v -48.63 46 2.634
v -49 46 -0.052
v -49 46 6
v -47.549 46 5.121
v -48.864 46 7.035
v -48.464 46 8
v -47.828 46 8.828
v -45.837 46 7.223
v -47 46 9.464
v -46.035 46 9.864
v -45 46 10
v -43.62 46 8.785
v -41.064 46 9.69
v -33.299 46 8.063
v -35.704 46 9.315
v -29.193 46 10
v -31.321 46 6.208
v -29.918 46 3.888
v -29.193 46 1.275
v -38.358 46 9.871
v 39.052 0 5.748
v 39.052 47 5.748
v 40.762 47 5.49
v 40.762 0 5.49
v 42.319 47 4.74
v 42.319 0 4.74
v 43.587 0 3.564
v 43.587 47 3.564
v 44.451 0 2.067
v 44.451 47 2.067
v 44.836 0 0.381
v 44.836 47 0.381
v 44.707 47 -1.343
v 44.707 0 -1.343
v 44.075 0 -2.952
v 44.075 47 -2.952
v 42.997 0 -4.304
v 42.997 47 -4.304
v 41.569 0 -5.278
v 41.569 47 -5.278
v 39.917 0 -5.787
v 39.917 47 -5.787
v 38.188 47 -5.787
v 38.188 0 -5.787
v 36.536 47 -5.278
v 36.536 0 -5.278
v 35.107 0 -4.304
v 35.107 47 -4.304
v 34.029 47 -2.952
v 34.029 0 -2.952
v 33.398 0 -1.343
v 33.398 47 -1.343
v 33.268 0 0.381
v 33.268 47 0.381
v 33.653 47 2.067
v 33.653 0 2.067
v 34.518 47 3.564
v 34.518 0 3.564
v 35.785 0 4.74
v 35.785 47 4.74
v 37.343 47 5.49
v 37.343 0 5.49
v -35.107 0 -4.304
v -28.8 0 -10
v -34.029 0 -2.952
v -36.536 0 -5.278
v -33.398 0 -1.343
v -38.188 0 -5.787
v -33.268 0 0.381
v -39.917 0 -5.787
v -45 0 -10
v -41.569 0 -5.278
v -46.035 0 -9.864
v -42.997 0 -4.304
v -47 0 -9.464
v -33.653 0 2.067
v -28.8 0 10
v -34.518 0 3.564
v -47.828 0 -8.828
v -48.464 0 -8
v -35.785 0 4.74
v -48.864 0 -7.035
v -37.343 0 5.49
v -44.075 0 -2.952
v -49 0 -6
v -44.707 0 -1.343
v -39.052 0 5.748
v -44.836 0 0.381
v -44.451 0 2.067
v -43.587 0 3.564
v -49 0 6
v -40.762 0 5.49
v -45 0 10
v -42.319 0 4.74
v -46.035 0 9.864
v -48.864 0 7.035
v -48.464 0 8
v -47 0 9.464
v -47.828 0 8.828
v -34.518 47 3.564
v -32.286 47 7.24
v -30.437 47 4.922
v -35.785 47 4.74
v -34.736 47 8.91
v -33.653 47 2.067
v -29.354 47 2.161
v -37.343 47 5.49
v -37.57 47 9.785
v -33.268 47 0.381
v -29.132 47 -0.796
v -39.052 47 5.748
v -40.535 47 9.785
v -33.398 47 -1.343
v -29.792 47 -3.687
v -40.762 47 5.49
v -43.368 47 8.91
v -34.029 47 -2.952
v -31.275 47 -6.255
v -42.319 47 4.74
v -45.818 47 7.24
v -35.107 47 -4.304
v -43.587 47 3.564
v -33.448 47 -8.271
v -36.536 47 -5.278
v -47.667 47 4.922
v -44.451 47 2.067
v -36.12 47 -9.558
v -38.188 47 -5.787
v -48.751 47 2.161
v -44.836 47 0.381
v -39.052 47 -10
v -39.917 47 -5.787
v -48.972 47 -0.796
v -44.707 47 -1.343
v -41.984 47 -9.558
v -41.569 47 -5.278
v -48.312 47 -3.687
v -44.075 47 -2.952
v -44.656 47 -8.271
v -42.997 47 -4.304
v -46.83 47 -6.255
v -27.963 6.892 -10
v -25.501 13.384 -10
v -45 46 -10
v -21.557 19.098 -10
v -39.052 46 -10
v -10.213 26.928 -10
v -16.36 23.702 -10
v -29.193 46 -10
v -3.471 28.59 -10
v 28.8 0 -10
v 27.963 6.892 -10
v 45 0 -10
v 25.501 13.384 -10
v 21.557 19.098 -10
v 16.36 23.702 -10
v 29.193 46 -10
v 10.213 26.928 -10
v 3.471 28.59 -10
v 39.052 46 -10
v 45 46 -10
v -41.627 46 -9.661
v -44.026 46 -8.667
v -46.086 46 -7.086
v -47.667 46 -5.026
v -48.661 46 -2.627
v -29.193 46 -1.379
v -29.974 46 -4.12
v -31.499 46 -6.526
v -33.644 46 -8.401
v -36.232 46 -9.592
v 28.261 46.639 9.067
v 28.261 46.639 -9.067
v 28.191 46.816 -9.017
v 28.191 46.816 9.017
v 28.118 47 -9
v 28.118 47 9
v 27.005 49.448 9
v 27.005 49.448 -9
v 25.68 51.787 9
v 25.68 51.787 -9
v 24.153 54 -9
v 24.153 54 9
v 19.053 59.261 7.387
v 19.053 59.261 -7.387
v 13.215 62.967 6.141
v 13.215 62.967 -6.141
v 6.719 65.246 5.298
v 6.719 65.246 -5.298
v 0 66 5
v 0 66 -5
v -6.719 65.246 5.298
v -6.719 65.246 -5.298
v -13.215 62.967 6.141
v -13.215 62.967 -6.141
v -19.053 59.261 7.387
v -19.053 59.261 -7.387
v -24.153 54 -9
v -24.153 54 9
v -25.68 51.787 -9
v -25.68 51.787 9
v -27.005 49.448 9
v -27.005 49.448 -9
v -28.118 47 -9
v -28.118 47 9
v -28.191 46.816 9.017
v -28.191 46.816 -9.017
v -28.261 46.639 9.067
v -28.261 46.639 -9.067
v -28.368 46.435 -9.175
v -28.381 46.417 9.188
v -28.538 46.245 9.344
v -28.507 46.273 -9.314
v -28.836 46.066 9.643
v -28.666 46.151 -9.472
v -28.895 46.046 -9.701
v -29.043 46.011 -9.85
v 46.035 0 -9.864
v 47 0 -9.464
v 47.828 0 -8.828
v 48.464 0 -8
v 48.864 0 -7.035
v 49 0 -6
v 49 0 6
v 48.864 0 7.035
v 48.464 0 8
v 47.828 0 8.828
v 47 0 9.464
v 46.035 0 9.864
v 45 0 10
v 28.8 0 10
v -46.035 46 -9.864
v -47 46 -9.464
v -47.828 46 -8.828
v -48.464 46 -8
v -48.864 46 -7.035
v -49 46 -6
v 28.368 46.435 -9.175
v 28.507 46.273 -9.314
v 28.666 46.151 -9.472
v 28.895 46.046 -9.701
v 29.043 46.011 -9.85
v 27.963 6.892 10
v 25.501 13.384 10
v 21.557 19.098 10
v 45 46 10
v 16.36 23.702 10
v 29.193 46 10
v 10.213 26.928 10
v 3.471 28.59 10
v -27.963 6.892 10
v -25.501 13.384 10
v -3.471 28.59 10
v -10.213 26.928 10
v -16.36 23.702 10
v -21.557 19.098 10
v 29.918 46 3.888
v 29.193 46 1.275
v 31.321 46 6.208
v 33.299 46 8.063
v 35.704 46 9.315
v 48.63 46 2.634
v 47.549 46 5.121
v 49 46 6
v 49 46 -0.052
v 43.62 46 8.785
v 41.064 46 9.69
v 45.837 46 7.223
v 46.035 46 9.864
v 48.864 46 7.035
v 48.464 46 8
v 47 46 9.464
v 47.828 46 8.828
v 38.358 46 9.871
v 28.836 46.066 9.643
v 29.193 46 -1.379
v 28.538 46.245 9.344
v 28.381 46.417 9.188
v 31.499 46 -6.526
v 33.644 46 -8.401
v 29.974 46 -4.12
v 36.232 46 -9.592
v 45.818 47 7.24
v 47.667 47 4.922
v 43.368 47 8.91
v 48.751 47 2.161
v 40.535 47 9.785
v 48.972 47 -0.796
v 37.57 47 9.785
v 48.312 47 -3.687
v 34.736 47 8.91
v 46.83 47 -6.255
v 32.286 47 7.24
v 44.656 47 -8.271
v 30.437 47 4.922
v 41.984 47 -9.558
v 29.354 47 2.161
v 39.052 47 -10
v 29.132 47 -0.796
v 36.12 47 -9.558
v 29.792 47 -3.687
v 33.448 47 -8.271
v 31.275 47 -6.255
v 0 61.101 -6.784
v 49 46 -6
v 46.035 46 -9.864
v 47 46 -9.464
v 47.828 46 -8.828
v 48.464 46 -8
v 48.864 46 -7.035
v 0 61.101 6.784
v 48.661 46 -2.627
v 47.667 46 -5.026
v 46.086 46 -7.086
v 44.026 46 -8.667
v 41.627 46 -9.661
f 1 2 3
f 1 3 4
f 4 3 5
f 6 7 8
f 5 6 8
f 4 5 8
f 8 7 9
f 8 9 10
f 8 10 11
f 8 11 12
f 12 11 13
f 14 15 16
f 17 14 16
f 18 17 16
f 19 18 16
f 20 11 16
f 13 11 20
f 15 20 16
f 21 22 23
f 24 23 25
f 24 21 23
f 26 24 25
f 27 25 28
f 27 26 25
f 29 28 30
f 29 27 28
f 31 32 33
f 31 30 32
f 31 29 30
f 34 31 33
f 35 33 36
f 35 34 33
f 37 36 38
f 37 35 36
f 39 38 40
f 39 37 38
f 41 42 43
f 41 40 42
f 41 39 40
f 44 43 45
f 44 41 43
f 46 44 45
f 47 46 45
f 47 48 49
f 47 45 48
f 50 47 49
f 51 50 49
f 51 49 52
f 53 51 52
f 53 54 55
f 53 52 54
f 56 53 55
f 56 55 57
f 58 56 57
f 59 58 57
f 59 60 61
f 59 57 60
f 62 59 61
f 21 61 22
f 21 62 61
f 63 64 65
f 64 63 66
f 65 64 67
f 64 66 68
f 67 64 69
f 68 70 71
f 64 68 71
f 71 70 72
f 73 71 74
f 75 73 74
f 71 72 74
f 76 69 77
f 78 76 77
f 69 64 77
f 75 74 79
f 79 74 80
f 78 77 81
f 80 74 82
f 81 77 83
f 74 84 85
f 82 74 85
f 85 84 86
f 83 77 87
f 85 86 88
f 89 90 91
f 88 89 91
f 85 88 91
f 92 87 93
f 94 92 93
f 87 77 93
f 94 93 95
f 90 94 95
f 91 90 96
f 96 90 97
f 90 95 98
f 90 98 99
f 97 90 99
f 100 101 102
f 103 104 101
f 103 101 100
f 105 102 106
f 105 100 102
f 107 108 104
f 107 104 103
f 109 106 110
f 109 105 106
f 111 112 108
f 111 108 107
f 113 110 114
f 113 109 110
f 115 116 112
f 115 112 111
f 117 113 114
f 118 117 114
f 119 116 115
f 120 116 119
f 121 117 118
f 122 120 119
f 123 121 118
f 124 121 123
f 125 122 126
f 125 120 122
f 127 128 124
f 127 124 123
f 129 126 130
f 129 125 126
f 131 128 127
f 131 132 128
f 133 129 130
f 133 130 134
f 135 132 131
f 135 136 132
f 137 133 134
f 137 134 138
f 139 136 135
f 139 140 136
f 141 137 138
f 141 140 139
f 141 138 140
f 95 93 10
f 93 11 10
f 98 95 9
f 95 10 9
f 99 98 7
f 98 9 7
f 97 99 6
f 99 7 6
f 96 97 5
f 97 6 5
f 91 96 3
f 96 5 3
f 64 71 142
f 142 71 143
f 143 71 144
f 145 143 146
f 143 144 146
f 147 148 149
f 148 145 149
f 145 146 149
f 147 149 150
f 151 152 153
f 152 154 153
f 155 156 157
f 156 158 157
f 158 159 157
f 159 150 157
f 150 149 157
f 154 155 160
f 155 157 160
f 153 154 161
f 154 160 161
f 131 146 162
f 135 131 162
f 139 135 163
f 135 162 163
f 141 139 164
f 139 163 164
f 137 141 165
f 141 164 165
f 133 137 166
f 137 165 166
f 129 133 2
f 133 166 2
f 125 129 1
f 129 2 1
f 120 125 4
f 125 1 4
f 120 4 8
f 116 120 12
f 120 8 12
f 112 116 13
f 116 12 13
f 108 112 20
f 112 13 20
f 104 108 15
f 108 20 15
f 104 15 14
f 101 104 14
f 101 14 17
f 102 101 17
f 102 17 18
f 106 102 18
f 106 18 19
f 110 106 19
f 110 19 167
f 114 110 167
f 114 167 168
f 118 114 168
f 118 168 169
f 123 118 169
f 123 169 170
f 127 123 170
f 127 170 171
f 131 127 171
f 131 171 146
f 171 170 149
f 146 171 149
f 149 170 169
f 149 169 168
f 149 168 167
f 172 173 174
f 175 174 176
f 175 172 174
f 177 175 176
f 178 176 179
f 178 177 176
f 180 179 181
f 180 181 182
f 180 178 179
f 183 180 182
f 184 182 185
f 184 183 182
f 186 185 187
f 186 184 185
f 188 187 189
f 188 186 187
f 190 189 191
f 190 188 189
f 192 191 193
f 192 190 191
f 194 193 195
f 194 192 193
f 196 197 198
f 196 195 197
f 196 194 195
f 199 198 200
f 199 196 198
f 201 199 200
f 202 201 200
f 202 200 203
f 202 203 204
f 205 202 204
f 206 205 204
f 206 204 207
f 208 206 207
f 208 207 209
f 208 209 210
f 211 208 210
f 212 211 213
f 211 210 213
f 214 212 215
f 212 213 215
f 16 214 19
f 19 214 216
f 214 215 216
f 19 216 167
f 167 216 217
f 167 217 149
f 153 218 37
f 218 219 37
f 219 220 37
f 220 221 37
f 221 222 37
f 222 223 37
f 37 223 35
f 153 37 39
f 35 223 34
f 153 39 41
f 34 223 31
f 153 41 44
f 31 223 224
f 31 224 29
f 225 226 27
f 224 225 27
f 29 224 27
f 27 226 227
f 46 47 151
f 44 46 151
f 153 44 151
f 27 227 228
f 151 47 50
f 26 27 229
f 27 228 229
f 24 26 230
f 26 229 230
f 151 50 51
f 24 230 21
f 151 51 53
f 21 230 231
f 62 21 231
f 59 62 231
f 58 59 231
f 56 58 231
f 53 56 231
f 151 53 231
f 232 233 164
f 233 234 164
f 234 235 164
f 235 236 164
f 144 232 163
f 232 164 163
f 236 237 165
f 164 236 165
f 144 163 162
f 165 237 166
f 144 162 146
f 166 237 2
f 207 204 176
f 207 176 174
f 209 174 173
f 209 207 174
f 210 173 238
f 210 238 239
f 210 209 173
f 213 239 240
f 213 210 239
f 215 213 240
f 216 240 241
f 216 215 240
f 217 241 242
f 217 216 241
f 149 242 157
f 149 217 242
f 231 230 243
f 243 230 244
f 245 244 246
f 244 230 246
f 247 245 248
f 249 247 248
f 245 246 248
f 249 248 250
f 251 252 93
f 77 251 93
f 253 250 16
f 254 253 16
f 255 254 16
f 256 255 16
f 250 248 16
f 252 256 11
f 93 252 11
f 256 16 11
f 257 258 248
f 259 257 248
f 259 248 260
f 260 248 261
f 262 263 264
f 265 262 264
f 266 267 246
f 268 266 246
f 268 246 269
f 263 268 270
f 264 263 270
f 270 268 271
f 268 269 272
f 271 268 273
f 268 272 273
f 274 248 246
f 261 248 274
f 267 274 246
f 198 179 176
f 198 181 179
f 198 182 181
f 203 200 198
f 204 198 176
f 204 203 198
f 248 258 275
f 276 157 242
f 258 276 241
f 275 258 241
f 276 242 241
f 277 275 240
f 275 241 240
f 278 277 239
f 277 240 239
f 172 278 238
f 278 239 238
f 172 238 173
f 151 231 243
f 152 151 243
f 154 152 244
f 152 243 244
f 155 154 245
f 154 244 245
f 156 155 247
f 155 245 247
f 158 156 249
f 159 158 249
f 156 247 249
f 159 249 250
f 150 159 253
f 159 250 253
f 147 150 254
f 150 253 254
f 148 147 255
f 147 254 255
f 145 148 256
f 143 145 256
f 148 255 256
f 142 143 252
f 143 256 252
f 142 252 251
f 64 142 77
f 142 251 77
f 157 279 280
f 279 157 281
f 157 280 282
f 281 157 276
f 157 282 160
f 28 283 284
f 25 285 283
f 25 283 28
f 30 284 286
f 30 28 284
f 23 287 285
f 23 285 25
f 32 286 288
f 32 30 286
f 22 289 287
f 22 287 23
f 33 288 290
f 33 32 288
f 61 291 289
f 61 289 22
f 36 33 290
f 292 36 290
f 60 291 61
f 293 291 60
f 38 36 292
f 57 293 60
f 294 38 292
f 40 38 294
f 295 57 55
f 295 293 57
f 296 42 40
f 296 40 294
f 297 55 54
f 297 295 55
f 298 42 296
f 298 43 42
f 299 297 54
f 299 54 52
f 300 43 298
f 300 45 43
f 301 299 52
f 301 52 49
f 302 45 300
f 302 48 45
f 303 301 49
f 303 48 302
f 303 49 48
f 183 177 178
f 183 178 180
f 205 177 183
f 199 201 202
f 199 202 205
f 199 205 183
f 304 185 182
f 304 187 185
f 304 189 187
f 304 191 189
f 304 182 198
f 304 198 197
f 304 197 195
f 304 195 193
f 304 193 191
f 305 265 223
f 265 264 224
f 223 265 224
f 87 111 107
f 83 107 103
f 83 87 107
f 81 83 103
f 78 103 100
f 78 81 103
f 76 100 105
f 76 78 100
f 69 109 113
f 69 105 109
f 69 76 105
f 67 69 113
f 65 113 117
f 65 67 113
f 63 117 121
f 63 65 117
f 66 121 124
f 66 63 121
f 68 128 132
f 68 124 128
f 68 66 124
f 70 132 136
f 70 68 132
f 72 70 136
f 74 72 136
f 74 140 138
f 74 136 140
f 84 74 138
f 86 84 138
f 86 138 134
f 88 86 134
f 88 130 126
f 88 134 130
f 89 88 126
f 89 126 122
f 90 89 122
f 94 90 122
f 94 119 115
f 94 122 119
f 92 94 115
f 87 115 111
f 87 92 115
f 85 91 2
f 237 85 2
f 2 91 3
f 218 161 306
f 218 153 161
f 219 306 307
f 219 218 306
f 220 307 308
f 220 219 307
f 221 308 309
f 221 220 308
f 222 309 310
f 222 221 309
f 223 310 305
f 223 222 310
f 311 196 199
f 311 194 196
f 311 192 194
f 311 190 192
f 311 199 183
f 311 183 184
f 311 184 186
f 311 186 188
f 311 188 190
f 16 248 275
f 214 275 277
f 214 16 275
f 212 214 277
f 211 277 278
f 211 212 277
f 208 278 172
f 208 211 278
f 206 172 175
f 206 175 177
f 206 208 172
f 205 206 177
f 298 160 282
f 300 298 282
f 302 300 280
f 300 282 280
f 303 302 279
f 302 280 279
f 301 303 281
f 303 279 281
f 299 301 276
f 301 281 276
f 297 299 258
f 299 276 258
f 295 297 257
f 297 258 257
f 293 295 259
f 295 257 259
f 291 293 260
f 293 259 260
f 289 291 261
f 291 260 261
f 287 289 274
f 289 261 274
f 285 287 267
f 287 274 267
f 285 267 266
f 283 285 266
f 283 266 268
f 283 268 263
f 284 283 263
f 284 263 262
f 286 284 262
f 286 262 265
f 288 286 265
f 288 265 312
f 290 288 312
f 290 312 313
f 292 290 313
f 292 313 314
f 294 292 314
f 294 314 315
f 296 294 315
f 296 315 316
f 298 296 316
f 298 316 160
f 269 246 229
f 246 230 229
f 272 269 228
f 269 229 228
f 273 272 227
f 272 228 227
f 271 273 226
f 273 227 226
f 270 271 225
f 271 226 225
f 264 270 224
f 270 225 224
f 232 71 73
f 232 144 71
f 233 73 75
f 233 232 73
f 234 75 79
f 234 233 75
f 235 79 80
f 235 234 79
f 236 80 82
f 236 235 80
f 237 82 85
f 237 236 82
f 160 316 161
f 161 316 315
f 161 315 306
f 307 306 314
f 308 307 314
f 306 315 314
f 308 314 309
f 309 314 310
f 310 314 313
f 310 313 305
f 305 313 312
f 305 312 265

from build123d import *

# Parameters (mm, degrees)
SALIENTE_EXTRUIR2_DEPTH    = 10
CROQUIS3_R                 = 9.947805623
SALIENTE_EXTRUIR3_DEPTH    = 1
CORTAR_EXTRUIR1_DEPTH      = 68.948509917
CORTAR_EXTRUIR1_DEPTH_BACK = 68.948509917
CROQUIS4_R                 = 5.8
SALIENTE_EXTRUIR4_DEPTH    = 9
CORTAR_EXTRUIR2_DEPTH      = 83.807004535
CORTAR_EXTRUIR2_DEPTH_BACK = 83.807004535
REDONDEO3_START            = -10.0000001
REDONDEO3_DEPTH            = 1.0000001
REDONDEO3_START_2          = 9
REDONDEO3_2_DEPTH          = 1
REDONDEO3_START_3          = -9
REDONDEO3_3_DEPTH          = 18
REDONDEO3_START_4          = -29.193321254
REDONDEO3_4_DEPTH          = 58.386642508
REDONDEO4_R                = 4


with BuildPart() as part:
    # Croquis2 → Saliente-Extruir2 (new, symmetric)
    with BuildSketch(Plane.XY):
        with BuildLine():
            Line((-49, 0), (-49, 46))
            Line((-49, 46), (49, 46))
            Line((49, 46), (49, 0))
            Line((49, 0), (28.8, 0))
            ThreePointArc((28.8, 0), (0, 28.8), (-28.8, 0))
            Line((-28.8, 0), (-49, 0))
        make_face()
    extrude(amount=SALIENTE_EXTRUIR2_DEPTH, both=True)

    # Croquis3 → Saliente-Extruir3 (add)
    with BuildSketch(Plane(origin=(0, 46, 0), x_dir=(1, 0, 0), z_dir=(0, 1, 0))):
        with Locations(Location((-39.052194377, 0.052194377, 0), (0, 0, 90))):
            Circle(CROQUIS3_R)
        with Locations(Location((39.052194377, 0.052194377, 0), (0, 0, 90))):
            Circle(CROQUIS3_R)
    extrude(amount=SALIENTE_EXTRUIR3_DEPTH)

    # Croquis4 → Cortar-Extruir1 (cut, two sides: drawn at the far end of the back side and taken through both)
    with BuildSketch(Plane(origin=(0, 46, 0), x_dir=(1, 0, 0), z_dir=(0, 1, 0)).offset(-CORTAR_EXTRUIR1_DEPTH_BACK)):
        with Locations(Location((-39.052194377, 0.052194377, 0), (0, 0, 270))):
            Circle(CROQUIS4_R)
        with Locations(Location((39.052194377, 0.052194377, 0), (0, 0, 270))):
            Circle(CROQUIS4_R)
    extrude(amount=CORTAR_EXTRUIR1_DEPTH + CORTAR_EXTRUIR1_DEPTH_BACK, mode=Mode.SUBTRACT)

    # Croquis5 → Saliente-Extruir4 (add, symmetric)
    with BuildSketch(Plane.XY):
        with BuildLine():
            Line((-28.5, 46), (28.5, 46))
            ThreePointArc((28.5, 46), (0, 66), (-28.5, 46))
        make_face()
    extrude(amount=SALIENTE_EXTRUIR4_DEPTH, both=True)

    # Croquis6 → Cortar-Extruir2 (cut, two sides: drawn at the far end of the back side and taken through both)
    with BuildSketch(Plane(origin=(0, 0, 0), x_dir=(0, 0, -1), z_dir=(1, 0, 0)).offset(-CORTAR_EXTRUIR2_DEPTH_BACK)):
        with BuildLine():
            Line((-9, 66), (-9, 54))
            add(Edge.make_bspline(
                [(-9, 54), (-6.728088744, 61.714285714), (-5, 66)],
                knots=[0, 0, 0, 0.174230423, 0.174230423, 0.174230423], degree=2, weights=[1, 1.104611797, 1.172770478]))
            Line((-5, 66), (-9, 66))
        make_face()
        with BuildLine():
            add(Edge.make_bspline(
                [(5, 66), (6.728088744, 61.714285714), (9, 54)],
                knots=[0.825769577, 0.825769577, 0.825769577, 1, 1, 1], degree=2, weights=[1.172770478, 1.104611797, 1]))
            Line((9, 54), (9, 66))
            Line((9, 66), (5, 66))
        make_face()
    extrude(amount=CORTAR_EXTRUIR2_DEPTH + CORTAR_EXTRUIR2_DEPTH_BACK, mode=Mode.SUBTRACT)

    # Redondeo3: read off the stored shape, not the designer's step
    # Redondeo3 outline → Redondeo3 (add)
    with BuildSketch(Plane.XY.offset(REDONDEO3_START)):
        with BuildLine():
            Line((-29.193321154, 46), (29.193321154, 46))
            ThreePointArc((29.193321154, 46), (28.62814416, 46.175030325), (28.260813391, 46.63885007))
            ThreePointArc((28.260813391, 46.63885007), (0, 66), (-28.260813391, 46.63885007))
            ThreePointArc((-28.260813391, 46.63885007), (-28.62814416, 46.175030325), (-29.193321154, 46))
        make_face()
    extrude(amount=REDONDEO3_DEPTH)

    # Redondeo3 2 outline → Redondeo3 2 (add)
    with BuildSketch(Plane.XY.offset(REDONDEO3_START_2)):
        with BuildLine():
            Line((-29.193321154, 46), (29.193321154, 46))
            ThreePointArc((29.193321154, 46), (28.62814416, 46.175030325), (28.260813391, 46.63885007))
            ThreePointArc((28.260813391, 46.63885007), (0, 66), (-28.260813391, 46.63885007))
            ThreePointArc((-28.260813391, 46.63885007), (-28.62814416, 46.175030325), (-29.193321154, 46))
        make_face()
    extrude(amount=REDONDEO3_2_DEPTH)

    # Redondeo3 3 outline → Redondeo3 3 (add)
    with BuildSketch(Plane.XY.offset(REDONDEO3_START_3)):
        with BuildLine():
            ThreePointArc((-28.5, 46), (-28.382204223, 46.320098033), (-28.260813391, 46.63885007))
            ThreePointArc((-28.260813391, 46.63885007), (-28.62814416, 46.175030325), (-29.193321154, 46))
            Line((-29.193321154, 46), (-28.5, 46))
        make_face()
        with BuildLine():
            ThreePointArc((29.193321154, 46), (28.62814416, 46.175030325), (28.260813391, 46.63885007))
            ThreePointArc((28.260813391, 46.63885007), (28.382204223, 46.320098033), (28.5, 46))
            Line((28.5, 46), (29.193321154, 46))
        make_face()
    extrude(amount=REDONDEO3_3_DEPTH)

    # Redondeo3 4 outline → Redondeo3 4 (cut)
    with BuildSketch(Plane.YZ.offset(REDONDEO3_START_4)):
        with BuildLine():
            Line((47, 9), (67, 9))
            Line((67, 9), (67, 10))
            Line((67, 10), (46, 10))
            ThreePointArc((46, 10), (46.292893219, 9.292893219), (47, 9))
        make_face()
        with BuildLine():
            Line((67, -10), (67, -9))
            Line((67, -9), (47, -9))
            ThreePointArc((47, -9), (46.292893219, -9.292893219), (46, -10))
            Line((46, -10), (67, -10))
        make_face()
    extrude(amount=REDONDEO3_4_DEPTH, mode=Mode.SUBTRACT)

    # Redondeo4
    redondeo4_edges = [part.edges().sort_by_distance(p)[0] for p in [
        (49, 23, 10),
        (-49, 23, 10),
        (-49, 23, -10),
        (49, 23, -10),
    ]]
    fillet(redondeo4_edges, radius=REDONDEO4_R)


solid = part.part
